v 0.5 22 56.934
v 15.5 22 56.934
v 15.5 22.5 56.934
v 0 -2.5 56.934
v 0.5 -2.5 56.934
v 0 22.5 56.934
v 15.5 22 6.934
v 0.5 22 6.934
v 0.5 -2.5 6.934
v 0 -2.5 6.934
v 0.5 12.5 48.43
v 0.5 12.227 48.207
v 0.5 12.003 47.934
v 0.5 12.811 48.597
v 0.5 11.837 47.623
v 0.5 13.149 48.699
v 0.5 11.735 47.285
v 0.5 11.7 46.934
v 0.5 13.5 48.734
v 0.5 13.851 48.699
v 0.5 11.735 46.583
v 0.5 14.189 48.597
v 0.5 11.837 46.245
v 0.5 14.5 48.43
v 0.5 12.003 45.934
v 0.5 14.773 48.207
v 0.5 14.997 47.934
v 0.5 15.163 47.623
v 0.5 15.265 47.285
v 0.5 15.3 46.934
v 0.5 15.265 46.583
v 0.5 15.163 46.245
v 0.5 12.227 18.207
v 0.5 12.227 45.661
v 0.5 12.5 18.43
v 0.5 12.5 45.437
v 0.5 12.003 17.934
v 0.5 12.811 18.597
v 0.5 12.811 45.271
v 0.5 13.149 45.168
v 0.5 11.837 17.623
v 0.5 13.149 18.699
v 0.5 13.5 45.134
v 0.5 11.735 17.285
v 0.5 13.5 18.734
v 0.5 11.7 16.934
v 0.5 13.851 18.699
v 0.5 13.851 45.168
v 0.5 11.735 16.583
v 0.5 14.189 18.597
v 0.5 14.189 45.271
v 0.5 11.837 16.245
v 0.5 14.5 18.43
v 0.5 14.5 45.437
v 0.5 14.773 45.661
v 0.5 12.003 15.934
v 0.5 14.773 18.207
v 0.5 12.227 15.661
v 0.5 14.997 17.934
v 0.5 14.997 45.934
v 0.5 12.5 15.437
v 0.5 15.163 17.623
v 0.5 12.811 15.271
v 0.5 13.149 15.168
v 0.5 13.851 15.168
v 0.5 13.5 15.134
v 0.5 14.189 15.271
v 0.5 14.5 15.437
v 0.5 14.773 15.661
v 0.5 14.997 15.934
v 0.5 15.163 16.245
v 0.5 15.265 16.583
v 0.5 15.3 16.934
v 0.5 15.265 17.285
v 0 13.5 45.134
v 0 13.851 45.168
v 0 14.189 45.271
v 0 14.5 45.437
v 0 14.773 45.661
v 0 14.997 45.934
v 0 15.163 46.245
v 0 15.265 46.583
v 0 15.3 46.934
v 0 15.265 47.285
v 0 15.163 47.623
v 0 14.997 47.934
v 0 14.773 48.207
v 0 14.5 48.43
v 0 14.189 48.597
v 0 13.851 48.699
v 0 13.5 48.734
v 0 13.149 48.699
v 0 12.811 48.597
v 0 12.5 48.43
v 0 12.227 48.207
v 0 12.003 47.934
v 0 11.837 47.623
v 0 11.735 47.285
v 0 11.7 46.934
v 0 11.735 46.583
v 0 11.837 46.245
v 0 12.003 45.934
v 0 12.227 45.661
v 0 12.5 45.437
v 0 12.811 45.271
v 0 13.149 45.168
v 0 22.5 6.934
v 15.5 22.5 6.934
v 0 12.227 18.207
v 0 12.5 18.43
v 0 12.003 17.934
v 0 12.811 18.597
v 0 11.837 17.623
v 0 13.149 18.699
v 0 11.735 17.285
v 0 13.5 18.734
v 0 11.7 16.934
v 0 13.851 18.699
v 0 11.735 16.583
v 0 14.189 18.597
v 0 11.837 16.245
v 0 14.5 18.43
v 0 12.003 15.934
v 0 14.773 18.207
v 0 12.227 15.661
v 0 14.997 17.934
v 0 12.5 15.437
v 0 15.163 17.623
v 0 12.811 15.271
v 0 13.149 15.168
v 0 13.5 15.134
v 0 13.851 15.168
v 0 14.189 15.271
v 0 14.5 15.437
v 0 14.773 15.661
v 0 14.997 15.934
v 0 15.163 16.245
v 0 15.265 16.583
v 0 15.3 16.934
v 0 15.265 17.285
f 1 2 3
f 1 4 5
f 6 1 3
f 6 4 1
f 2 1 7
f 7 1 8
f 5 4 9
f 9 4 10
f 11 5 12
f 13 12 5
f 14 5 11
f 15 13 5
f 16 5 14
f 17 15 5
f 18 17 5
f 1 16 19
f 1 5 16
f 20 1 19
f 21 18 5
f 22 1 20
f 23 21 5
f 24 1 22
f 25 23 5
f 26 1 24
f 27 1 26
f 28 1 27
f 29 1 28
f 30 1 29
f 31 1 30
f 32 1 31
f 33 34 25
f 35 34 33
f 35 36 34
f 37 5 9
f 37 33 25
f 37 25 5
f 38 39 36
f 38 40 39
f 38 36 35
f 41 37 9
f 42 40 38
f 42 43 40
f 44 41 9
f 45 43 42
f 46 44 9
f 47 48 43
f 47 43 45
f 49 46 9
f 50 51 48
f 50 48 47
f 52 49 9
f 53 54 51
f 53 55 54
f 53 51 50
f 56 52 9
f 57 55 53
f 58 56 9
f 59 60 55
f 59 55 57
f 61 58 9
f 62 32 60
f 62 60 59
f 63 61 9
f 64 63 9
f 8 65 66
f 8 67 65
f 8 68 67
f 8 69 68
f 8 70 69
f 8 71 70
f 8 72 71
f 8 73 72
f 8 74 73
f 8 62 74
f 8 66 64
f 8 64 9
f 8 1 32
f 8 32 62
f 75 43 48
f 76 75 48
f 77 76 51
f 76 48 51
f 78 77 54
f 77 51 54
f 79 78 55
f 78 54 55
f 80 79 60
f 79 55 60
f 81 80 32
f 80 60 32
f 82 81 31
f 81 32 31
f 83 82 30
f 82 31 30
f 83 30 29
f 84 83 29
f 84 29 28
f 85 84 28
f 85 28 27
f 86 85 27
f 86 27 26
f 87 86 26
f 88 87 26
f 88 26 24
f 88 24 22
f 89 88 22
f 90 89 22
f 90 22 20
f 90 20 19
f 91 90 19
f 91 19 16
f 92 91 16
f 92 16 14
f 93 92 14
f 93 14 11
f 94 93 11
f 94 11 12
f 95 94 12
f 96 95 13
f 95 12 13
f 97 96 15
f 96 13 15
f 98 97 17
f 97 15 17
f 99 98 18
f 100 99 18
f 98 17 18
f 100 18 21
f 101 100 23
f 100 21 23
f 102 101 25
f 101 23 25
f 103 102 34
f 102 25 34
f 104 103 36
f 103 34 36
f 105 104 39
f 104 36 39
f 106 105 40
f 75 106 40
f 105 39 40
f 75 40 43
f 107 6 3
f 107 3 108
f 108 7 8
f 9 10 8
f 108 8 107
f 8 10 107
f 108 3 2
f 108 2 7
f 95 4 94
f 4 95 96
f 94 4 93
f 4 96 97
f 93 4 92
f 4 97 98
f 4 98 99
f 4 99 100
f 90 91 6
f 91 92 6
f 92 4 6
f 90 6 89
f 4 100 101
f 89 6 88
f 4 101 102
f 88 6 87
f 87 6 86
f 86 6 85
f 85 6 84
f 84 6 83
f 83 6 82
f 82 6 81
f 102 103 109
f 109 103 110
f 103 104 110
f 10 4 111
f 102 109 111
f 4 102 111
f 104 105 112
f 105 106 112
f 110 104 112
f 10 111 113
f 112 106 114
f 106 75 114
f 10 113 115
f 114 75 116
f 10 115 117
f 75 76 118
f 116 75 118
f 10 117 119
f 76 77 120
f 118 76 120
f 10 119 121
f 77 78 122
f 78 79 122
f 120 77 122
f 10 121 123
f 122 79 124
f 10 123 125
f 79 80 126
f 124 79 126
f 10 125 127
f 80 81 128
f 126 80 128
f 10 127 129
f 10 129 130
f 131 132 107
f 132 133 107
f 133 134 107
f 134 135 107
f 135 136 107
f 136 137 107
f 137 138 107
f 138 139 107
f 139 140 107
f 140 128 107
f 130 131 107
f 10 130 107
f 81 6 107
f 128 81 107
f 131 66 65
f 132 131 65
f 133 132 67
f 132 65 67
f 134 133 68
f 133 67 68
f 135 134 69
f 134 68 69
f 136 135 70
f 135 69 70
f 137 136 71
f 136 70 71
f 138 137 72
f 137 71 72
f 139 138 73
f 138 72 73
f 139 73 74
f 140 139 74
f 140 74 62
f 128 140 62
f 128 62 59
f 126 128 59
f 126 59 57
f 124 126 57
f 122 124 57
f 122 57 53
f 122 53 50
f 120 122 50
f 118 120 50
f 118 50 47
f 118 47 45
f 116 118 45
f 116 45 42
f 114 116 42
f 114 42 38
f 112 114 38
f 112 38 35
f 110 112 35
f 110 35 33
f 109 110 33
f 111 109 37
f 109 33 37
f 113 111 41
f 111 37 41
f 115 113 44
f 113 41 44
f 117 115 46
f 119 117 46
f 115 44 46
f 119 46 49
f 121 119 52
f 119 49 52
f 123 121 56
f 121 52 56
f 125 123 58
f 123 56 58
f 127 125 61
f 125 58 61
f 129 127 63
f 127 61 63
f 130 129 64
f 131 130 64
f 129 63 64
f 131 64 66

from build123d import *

# Parameters (mm, degrees)
SKETCH_1_W                  = 50
SKETCH_1_H                  = 25
EXTRUDE_1_DEPTH             = 0.5
SKETCH_2_W                  = 50
SKETCH_2_H                  = 0.5
EXTRUDE_2_DEPTH             = 15
HOLE_WIZARD_3_6_3_6_1_D     = 3.6
HOLE_WIZARD_3_6_3_6_1_DEPTH = 10
HOLE_WIZARD_3_6_3_6_1_TIP   = 1.081549114


with BuildPart() as part:
    # Эскиз1 → Бобышка-Вытянуть1 (new body)
    with BuildSketch(Plane(origin=(0, 0, 0), x_dir=(0, 0, -1), z_dir=(1, 0, 0))):
        with Locations((-31.933808614, 10.000042269)):
            Rectangle(SKETCH_1_W, SKETCH_1_H)
    extrude(amount=EXTRUDE_1_DEPTH)

    # Эскиз2 → Бобышка-Вытянуть2 (add)
    with BuildSketch(Plane(origin=(0.5, 0, 0), x_dir=(0, 0, -1), z_dir=(1, 0, 0))):
        with Locations((-31.933808614, 22.250042269)):
            Rectangle(SKETCH_2_W, SKETCH_2_H)
    extrude(amount=EXTRUDE_2_DEPTH)

    # Диаметр отверстия Ø3.6 (3.6)1
    with Locations(Plane.ZY):
        with Locations((16.933808614, 13.500042269), (46.933808614, 13.500042269)):
            Hole(HOLE_WIZARD_3_6_3_6_1_D / 2, depth=HOLE_WIZARD_3_6_3_6_1_DEPTH)
            with Locations((0, 0, -(HOLE_WIZARD_3_6_3_6_1_DEPTH + HOLE_WIZARD_3_6_3_6_1_TIP / 2))):  # 118° drill point
                Cone(0, HOLE_WIZARD_3_6_3_6_1_D / 2, HOLE_WIZARD_3_6_3_6_1_TIP, mode=Mode.SUBTRACT)


solid = part.part
